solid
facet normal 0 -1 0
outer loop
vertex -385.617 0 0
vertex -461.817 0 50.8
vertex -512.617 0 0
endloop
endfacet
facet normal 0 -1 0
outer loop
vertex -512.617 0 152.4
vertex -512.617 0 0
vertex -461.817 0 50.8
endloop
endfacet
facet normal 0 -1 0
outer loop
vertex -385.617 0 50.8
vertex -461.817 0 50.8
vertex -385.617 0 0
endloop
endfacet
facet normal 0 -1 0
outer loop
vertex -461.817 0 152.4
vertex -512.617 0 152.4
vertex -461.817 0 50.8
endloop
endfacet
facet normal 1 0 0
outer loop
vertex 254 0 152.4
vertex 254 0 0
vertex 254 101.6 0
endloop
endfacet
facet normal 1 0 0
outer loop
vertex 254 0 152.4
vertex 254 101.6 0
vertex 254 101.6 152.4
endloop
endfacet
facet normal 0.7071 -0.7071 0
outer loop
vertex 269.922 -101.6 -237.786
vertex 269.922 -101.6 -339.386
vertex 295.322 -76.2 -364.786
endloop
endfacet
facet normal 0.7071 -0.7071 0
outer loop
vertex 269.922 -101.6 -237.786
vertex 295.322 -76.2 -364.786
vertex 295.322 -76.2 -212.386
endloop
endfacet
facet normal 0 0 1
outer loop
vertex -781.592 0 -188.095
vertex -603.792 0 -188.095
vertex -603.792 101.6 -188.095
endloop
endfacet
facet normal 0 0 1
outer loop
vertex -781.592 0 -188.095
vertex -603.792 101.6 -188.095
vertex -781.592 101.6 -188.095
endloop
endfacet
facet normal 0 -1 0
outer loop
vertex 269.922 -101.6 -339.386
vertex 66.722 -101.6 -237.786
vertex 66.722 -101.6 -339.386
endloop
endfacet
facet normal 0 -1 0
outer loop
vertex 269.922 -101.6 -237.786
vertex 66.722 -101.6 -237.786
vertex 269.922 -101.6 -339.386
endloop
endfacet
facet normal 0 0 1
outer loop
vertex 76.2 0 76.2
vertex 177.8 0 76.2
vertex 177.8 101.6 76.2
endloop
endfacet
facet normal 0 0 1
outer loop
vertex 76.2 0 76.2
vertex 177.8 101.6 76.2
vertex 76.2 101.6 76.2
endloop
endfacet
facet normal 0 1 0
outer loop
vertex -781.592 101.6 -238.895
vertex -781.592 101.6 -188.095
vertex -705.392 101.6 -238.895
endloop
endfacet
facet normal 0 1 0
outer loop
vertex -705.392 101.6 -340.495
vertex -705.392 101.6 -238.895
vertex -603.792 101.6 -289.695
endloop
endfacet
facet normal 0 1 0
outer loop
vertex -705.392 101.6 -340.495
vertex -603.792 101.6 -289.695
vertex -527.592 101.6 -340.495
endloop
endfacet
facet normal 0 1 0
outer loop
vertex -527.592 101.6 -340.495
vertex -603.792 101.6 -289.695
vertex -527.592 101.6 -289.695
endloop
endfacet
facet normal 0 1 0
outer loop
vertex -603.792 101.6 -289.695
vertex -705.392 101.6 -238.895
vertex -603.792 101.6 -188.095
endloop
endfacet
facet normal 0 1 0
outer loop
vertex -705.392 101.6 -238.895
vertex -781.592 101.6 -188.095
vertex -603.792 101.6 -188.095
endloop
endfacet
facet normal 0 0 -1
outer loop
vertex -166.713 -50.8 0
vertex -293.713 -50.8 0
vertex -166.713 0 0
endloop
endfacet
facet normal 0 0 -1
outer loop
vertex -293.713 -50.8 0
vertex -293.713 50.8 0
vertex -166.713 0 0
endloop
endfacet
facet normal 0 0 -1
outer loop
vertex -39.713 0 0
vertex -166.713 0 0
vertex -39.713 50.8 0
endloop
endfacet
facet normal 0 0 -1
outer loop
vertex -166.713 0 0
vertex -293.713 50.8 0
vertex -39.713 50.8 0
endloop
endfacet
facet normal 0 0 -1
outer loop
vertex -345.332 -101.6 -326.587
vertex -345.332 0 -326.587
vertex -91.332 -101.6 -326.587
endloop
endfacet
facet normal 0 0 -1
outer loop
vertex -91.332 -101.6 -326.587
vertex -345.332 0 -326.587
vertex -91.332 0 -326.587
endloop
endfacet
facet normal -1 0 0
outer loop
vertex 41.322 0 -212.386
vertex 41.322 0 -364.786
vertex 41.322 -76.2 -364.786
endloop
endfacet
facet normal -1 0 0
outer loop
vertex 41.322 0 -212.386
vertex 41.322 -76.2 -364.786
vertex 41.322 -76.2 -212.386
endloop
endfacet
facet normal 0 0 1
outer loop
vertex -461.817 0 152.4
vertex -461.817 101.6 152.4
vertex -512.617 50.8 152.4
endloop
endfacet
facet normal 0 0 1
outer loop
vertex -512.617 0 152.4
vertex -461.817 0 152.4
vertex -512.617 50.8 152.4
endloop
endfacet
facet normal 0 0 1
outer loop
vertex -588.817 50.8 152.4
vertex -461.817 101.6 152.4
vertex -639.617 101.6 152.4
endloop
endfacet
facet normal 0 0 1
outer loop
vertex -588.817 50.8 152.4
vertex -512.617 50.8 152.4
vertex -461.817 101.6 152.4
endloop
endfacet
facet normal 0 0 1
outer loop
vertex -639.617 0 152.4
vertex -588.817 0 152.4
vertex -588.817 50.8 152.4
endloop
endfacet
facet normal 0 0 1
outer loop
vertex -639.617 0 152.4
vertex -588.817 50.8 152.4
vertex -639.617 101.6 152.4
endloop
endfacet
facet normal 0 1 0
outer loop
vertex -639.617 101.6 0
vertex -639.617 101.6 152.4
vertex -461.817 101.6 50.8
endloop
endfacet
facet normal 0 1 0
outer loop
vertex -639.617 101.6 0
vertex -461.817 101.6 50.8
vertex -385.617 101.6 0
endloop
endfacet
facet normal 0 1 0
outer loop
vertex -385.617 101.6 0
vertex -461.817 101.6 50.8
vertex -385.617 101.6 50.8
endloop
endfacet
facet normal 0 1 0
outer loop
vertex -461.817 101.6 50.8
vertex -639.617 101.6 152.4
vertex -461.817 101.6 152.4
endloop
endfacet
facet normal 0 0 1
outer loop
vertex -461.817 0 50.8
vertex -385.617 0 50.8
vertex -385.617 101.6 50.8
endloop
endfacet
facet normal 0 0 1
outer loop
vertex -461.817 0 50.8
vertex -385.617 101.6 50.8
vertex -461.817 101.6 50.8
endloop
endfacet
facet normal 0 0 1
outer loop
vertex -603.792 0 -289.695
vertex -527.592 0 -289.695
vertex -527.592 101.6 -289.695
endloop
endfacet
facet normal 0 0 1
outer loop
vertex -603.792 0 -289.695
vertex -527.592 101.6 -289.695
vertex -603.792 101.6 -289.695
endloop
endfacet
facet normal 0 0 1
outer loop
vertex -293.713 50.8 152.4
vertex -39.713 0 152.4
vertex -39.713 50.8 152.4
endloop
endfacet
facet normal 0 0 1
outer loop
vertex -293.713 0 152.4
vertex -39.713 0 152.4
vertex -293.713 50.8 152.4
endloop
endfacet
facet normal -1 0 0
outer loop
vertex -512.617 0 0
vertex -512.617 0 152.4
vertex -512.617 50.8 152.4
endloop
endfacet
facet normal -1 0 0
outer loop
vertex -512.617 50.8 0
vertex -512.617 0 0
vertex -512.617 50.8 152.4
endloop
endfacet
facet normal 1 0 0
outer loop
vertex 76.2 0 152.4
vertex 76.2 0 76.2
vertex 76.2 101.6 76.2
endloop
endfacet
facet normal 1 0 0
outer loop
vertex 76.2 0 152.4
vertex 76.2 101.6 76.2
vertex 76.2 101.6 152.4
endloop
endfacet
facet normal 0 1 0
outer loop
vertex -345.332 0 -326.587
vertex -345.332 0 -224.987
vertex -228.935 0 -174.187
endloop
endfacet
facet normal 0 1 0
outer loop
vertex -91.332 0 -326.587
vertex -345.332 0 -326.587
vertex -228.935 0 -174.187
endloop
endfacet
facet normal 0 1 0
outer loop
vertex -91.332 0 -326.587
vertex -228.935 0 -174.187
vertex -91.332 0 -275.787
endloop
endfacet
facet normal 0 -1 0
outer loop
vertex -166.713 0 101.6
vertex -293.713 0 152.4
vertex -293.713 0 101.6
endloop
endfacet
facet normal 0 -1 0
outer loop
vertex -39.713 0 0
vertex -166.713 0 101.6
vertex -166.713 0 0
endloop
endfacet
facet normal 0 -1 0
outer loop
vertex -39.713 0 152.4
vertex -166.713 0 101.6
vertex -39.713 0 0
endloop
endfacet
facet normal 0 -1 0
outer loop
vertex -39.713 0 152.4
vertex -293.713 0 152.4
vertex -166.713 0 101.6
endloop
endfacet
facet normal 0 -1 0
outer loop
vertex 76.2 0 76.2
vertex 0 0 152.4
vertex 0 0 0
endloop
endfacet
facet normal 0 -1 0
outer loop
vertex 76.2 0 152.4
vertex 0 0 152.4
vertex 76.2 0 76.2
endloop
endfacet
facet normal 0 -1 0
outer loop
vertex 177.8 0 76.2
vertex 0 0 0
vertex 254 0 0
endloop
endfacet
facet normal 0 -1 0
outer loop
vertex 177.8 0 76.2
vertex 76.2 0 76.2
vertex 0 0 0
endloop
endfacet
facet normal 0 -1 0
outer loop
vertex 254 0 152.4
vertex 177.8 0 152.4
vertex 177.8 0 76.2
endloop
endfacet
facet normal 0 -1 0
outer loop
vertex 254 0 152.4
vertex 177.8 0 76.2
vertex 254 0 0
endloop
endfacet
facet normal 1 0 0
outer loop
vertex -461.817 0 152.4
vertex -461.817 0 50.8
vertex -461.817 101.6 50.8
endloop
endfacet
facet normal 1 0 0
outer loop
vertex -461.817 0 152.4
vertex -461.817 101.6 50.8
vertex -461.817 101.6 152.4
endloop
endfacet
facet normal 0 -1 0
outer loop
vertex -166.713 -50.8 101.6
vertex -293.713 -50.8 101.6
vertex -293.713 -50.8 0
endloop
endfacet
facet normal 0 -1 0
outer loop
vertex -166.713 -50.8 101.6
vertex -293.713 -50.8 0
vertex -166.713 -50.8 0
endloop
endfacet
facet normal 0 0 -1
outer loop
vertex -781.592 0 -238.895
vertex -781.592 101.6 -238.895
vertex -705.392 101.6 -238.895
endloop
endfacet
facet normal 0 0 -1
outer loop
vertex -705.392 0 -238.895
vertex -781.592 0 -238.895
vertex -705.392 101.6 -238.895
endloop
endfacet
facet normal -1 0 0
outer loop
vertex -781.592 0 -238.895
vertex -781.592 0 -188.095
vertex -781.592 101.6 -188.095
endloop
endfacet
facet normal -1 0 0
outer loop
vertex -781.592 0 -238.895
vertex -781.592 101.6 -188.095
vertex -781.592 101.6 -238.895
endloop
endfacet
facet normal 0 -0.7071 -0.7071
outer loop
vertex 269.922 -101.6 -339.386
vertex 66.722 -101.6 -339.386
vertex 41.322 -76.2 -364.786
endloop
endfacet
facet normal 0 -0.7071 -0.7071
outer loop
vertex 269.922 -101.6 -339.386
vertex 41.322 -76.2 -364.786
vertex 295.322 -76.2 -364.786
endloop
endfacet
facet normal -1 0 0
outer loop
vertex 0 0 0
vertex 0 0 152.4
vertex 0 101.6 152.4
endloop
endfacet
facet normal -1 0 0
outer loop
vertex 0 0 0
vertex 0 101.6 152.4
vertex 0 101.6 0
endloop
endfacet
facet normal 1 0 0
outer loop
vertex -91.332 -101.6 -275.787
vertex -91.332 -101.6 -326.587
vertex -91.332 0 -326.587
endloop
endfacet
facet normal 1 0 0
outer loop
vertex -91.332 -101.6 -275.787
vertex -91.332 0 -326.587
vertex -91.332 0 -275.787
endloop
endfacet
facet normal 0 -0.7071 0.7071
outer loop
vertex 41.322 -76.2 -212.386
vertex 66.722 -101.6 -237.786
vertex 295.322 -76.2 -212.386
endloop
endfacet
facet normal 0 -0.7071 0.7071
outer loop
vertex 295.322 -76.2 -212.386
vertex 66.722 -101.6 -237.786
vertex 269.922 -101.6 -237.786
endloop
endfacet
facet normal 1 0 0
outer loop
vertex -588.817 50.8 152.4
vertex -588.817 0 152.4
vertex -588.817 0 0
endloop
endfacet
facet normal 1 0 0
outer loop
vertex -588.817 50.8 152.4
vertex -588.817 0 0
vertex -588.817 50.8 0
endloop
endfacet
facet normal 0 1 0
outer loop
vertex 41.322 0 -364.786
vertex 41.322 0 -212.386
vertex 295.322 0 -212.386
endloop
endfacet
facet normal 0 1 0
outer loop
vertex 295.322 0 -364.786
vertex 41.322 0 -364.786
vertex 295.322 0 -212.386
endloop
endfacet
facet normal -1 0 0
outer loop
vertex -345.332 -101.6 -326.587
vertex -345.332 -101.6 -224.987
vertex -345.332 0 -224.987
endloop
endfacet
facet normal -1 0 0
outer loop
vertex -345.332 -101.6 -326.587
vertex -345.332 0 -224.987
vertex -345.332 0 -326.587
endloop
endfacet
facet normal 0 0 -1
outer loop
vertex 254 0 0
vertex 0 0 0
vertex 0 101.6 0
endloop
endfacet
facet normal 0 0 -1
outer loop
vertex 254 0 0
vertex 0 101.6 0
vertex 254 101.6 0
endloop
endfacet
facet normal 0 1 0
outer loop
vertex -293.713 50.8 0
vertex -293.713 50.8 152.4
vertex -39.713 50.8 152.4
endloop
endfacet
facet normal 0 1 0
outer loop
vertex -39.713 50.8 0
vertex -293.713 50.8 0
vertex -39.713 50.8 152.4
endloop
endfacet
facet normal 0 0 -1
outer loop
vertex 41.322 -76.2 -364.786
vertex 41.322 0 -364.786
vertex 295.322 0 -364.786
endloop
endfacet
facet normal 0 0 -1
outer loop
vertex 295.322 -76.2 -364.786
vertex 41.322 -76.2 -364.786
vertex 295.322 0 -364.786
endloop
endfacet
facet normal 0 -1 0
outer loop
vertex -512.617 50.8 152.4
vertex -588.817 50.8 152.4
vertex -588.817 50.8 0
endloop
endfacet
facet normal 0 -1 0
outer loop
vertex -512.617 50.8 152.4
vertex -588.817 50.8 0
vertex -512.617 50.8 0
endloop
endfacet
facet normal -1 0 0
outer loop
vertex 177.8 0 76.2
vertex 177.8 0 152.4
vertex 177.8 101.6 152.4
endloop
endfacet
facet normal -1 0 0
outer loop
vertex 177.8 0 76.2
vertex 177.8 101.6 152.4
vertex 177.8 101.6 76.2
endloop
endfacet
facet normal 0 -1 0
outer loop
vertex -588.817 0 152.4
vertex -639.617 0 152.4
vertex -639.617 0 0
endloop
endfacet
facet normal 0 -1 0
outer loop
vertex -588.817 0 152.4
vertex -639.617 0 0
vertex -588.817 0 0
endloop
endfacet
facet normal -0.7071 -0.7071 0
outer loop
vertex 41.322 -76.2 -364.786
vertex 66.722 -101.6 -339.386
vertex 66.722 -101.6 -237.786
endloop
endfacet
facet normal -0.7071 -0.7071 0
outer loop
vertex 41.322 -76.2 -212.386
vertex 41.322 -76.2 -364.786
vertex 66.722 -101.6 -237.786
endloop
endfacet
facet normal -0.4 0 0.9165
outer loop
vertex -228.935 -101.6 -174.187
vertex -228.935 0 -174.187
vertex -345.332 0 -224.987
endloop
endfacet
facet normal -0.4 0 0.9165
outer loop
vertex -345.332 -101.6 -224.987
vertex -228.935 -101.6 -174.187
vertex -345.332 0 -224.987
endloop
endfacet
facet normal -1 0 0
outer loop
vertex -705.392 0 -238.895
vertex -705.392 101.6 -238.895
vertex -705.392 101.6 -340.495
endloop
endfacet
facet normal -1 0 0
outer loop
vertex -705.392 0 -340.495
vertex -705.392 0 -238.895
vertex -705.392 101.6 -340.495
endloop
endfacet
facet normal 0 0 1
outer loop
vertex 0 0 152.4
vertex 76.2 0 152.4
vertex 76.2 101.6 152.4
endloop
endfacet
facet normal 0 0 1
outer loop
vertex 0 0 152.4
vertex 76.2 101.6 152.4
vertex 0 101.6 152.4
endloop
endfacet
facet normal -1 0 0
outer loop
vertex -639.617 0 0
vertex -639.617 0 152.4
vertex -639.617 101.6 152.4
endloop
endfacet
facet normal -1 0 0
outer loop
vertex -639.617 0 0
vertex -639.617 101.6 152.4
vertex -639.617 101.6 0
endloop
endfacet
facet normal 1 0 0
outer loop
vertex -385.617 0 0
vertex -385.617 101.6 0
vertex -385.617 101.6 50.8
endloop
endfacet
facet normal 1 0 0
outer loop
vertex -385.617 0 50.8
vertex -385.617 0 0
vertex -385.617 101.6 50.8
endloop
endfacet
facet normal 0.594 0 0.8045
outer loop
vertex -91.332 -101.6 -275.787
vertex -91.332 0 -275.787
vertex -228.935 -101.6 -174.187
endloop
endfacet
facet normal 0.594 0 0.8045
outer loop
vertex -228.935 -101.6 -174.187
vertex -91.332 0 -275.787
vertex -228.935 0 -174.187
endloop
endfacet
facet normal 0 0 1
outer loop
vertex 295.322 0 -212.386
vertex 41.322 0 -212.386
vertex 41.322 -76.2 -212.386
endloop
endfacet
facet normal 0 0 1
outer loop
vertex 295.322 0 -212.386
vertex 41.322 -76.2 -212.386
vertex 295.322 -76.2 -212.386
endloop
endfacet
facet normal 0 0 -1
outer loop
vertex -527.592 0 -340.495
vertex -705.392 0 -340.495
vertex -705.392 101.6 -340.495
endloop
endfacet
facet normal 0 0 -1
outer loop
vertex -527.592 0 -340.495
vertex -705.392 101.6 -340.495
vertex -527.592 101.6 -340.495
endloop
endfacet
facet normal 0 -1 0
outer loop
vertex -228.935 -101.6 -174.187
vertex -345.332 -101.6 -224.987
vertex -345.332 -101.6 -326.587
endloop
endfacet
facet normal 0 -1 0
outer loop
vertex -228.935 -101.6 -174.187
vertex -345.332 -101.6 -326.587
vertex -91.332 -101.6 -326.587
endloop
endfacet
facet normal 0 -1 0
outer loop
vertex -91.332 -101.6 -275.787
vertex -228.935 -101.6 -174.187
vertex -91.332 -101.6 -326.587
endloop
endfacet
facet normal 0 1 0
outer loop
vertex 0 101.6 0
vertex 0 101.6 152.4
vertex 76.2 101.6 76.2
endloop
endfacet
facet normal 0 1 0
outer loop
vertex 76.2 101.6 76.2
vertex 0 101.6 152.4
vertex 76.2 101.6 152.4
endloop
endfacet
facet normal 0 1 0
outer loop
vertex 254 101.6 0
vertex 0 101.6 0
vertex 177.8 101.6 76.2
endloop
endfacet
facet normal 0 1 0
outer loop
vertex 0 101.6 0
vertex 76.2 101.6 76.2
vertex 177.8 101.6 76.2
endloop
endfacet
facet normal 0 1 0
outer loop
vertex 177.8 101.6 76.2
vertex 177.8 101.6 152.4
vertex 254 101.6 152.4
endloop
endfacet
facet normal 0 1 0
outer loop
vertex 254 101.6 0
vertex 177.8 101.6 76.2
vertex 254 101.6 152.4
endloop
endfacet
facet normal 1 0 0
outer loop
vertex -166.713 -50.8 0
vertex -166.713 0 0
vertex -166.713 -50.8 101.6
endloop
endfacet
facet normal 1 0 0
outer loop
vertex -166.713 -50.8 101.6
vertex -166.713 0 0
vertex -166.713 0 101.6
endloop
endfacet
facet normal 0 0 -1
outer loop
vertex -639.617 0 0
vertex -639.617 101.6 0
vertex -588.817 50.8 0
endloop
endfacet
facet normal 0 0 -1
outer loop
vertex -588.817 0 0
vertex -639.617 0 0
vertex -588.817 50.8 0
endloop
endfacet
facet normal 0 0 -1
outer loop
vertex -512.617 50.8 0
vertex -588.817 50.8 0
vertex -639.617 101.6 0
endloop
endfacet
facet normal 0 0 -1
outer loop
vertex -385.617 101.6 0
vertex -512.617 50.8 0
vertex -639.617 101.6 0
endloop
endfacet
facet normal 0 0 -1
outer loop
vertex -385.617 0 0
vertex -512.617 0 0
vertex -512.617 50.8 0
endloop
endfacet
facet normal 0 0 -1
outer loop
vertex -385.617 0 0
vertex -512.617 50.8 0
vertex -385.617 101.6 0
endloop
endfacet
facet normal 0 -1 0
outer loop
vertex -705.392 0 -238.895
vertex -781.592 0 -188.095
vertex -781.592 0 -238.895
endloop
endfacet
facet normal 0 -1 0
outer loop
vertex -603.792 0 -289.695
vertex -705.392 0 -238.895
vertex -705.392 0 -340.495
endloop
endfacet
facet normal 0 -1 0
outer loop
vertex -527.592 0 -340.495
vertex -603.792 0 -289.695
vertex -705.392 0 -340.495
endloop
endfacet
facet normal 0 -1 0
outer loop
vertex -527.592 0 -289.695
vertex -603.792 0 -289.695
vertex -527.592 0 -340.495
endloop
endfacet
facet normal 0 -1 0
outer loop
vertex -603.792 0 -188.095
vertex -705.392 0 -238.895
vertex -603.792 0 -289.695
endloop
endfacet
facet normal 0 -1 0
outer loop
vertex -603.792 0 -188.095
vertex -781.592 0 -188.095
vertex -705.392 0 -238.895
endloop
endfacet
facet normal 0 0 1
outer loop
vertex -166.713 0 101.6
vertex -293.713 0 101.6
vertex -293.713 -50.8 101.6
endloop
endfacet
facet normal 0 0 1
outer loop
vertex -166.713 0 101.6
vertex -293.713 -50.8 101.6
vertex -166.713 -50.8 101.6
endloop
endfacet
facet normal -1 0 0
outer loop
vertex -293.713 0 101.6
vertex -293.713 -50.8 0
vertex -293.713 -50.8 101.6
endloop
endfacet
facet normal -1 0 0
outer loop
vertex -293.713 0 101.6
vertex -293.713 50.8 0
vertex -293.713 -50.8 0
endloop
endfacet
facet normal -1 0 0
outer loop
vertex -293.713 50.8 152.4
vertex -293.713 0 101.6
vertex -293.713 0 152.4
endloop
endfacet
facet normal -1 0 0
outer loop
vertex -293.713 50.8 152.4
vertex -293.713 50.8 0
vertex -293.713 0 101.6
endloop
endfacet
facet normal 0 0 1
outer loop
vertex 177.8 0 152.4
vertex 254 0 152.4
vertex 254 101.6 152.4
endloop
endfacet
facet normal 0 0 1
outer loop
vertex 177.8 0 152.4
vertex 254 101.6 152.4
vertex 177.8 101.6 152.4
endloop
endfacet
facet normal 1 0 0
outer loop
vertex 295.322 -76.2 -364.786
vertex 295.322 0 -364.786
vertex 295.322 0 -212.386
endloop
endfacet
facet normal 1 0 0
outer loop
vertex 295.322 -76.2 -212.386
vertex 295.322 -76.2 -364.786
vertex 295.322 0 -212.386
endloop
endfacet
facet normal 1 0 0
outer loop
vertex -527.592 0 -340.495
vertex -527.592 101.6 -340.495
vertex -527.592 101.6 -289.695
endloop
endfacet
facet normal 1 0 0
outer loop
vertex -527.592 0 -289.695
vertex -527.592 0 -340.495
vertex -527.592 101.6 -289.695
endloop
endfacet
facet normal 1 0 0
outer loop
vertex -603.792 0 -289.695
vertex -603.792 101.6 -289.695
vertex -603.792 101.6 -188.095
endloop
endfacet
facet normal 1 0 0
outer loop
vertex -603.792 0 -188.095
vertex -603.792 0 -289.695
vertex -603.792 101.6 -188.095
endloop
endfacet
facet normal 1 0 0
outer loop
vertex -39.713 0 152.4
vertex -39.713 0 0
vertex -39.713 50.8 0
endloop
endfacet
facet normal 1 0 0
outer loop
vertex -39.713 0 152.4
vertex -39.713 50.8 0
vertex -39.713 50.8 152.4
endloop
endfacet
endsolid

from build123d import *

# Parameters (mm, degrees)
F1_DEPTH  = 101.6
F2_W      = 127
F2_H      = 101.6
F3_DEPTH  = 50.8
F4_W      = 127
F4_H      = 101.6
F5_DEPTH  = 50.8
F7_DEPTH  = 101.6
F8_W      = 76.2
F8_H      = 50.8
F9_DEPTH  = 152.4
F11_DEPTH = 101.6
F13_DEPTH = 101.6
F14_W     = 254
F14_H     = 152.4
F15_DEPTH = 101.6
F16_SIZE  = 25.4


with BuildPart() as f1:
    # F0 (on Front) → F1 (new body)
    with BuildSketch(Plane.XZ):
        Polygon((0, 152.4), (0, 0), (254, 0), (254, 152.4), (177.8, 152.4), (177.8, 76.2), (76.2, 76.2), (76.2, 152.4), align=None)
    extrude(amount=-F1_DEPTH)


with BuildPart() as f3:
    # F2 (on Front) → F3 (new body)
    with BuildSketch(Plane.XZ):
        Polygon((-166.712991, 0), (-114.024056, 0), (-39.712991, 0), (-39.712991, 152.4), (-293.712991, 152.4), (-293.712991, 101.6), (-166.712991, 101.6), align=None)
        with Locations((-230.212991, 50.8)):
            Rectangle(F2_W, F2_H)
    extrude(amount=-F3_DEPTH)

    # F4 (on face) → F5 (join)
    with BuildSketch(Plane.XZ):
        with Locations((-230.212991, 50.8)):
            Rectangle(F4_W, F4_H)
    extrude(amount=F5_DEPTH)


with BuildPart() as f7:
    # F6 (on Front) → F7 (new body)
    with BuildSketch(Plane.XZ):
        Polygon((-639.616827, 152.4), (-639.616827, 0), (-385.616827, 0), (-385.616827, 50.8), (-461.816827, 50.8), (-461.816827, 152.4), align=None)
    extrude(amount=-F7_DEPTH)

    # F8 (on face) → F9 (cut)
    with BuildSketch(Plane.XY.offset(152.4)):
        with Locations((-550.716827, 25.4)):
            Rectangle(F8_W, F8_H)
    extrude(amount=-F9_DEPTH, mode=Mode.SUBTRACT)


with BuildPart() as f11:
    # F10 (on Front) → F11 (new body)
    with BuildSketch(Plane.XZ):
        Polygon((-603.791957, -188.094909), (-781.591957, -188.094909), (-781.591957, -238.894909), (-705.391957, -238.894909), (-705.391957, -340.494909), (-527.591957, -340.494909), (-527.591957, -289.694909), (-603.791957, -289.694909), align=None)
    extrude(amount=-F11_DEPTH)


with BuildPart() as f13:
    # F12 (on Front) → F13 (new body)
    with BuildSketch(Plane.XZ):
        Polygon((-345.33206, -224.986609), (-345.33206, -326.586609), (-91.33206, -326.586609), (-91.33206, -275.786609), (-228.934637, -174.186609), align=None)
    extrude(amount=F13_DEPTH)


with BuildPart() as f15:
    # F14 (on Front) → F15 (new body)
    with BuildSketch(Plane.XZ):
        with Locations((168.321833, -288.585546)):
            Rectangle(F14_W, F14_H)
    extrude(amount=F15_DEPTH)

    # F16
    f16_edges = [f15.edges().sort_by_distance(p)[0] for p in [
        (168.321833, -101.6, -212.385546),
        (41.321833, -101.6, -288.585546),
        (168.321833, -101.6, -364.785546),
        (295.321833, -101.6, -288.585546),
    ]]
    chamfer(f16_edges, length=F16_SIZE)


solid = Compound([f1.part, f3.part, f7.part, f11.part, f13.part, f15.part])
